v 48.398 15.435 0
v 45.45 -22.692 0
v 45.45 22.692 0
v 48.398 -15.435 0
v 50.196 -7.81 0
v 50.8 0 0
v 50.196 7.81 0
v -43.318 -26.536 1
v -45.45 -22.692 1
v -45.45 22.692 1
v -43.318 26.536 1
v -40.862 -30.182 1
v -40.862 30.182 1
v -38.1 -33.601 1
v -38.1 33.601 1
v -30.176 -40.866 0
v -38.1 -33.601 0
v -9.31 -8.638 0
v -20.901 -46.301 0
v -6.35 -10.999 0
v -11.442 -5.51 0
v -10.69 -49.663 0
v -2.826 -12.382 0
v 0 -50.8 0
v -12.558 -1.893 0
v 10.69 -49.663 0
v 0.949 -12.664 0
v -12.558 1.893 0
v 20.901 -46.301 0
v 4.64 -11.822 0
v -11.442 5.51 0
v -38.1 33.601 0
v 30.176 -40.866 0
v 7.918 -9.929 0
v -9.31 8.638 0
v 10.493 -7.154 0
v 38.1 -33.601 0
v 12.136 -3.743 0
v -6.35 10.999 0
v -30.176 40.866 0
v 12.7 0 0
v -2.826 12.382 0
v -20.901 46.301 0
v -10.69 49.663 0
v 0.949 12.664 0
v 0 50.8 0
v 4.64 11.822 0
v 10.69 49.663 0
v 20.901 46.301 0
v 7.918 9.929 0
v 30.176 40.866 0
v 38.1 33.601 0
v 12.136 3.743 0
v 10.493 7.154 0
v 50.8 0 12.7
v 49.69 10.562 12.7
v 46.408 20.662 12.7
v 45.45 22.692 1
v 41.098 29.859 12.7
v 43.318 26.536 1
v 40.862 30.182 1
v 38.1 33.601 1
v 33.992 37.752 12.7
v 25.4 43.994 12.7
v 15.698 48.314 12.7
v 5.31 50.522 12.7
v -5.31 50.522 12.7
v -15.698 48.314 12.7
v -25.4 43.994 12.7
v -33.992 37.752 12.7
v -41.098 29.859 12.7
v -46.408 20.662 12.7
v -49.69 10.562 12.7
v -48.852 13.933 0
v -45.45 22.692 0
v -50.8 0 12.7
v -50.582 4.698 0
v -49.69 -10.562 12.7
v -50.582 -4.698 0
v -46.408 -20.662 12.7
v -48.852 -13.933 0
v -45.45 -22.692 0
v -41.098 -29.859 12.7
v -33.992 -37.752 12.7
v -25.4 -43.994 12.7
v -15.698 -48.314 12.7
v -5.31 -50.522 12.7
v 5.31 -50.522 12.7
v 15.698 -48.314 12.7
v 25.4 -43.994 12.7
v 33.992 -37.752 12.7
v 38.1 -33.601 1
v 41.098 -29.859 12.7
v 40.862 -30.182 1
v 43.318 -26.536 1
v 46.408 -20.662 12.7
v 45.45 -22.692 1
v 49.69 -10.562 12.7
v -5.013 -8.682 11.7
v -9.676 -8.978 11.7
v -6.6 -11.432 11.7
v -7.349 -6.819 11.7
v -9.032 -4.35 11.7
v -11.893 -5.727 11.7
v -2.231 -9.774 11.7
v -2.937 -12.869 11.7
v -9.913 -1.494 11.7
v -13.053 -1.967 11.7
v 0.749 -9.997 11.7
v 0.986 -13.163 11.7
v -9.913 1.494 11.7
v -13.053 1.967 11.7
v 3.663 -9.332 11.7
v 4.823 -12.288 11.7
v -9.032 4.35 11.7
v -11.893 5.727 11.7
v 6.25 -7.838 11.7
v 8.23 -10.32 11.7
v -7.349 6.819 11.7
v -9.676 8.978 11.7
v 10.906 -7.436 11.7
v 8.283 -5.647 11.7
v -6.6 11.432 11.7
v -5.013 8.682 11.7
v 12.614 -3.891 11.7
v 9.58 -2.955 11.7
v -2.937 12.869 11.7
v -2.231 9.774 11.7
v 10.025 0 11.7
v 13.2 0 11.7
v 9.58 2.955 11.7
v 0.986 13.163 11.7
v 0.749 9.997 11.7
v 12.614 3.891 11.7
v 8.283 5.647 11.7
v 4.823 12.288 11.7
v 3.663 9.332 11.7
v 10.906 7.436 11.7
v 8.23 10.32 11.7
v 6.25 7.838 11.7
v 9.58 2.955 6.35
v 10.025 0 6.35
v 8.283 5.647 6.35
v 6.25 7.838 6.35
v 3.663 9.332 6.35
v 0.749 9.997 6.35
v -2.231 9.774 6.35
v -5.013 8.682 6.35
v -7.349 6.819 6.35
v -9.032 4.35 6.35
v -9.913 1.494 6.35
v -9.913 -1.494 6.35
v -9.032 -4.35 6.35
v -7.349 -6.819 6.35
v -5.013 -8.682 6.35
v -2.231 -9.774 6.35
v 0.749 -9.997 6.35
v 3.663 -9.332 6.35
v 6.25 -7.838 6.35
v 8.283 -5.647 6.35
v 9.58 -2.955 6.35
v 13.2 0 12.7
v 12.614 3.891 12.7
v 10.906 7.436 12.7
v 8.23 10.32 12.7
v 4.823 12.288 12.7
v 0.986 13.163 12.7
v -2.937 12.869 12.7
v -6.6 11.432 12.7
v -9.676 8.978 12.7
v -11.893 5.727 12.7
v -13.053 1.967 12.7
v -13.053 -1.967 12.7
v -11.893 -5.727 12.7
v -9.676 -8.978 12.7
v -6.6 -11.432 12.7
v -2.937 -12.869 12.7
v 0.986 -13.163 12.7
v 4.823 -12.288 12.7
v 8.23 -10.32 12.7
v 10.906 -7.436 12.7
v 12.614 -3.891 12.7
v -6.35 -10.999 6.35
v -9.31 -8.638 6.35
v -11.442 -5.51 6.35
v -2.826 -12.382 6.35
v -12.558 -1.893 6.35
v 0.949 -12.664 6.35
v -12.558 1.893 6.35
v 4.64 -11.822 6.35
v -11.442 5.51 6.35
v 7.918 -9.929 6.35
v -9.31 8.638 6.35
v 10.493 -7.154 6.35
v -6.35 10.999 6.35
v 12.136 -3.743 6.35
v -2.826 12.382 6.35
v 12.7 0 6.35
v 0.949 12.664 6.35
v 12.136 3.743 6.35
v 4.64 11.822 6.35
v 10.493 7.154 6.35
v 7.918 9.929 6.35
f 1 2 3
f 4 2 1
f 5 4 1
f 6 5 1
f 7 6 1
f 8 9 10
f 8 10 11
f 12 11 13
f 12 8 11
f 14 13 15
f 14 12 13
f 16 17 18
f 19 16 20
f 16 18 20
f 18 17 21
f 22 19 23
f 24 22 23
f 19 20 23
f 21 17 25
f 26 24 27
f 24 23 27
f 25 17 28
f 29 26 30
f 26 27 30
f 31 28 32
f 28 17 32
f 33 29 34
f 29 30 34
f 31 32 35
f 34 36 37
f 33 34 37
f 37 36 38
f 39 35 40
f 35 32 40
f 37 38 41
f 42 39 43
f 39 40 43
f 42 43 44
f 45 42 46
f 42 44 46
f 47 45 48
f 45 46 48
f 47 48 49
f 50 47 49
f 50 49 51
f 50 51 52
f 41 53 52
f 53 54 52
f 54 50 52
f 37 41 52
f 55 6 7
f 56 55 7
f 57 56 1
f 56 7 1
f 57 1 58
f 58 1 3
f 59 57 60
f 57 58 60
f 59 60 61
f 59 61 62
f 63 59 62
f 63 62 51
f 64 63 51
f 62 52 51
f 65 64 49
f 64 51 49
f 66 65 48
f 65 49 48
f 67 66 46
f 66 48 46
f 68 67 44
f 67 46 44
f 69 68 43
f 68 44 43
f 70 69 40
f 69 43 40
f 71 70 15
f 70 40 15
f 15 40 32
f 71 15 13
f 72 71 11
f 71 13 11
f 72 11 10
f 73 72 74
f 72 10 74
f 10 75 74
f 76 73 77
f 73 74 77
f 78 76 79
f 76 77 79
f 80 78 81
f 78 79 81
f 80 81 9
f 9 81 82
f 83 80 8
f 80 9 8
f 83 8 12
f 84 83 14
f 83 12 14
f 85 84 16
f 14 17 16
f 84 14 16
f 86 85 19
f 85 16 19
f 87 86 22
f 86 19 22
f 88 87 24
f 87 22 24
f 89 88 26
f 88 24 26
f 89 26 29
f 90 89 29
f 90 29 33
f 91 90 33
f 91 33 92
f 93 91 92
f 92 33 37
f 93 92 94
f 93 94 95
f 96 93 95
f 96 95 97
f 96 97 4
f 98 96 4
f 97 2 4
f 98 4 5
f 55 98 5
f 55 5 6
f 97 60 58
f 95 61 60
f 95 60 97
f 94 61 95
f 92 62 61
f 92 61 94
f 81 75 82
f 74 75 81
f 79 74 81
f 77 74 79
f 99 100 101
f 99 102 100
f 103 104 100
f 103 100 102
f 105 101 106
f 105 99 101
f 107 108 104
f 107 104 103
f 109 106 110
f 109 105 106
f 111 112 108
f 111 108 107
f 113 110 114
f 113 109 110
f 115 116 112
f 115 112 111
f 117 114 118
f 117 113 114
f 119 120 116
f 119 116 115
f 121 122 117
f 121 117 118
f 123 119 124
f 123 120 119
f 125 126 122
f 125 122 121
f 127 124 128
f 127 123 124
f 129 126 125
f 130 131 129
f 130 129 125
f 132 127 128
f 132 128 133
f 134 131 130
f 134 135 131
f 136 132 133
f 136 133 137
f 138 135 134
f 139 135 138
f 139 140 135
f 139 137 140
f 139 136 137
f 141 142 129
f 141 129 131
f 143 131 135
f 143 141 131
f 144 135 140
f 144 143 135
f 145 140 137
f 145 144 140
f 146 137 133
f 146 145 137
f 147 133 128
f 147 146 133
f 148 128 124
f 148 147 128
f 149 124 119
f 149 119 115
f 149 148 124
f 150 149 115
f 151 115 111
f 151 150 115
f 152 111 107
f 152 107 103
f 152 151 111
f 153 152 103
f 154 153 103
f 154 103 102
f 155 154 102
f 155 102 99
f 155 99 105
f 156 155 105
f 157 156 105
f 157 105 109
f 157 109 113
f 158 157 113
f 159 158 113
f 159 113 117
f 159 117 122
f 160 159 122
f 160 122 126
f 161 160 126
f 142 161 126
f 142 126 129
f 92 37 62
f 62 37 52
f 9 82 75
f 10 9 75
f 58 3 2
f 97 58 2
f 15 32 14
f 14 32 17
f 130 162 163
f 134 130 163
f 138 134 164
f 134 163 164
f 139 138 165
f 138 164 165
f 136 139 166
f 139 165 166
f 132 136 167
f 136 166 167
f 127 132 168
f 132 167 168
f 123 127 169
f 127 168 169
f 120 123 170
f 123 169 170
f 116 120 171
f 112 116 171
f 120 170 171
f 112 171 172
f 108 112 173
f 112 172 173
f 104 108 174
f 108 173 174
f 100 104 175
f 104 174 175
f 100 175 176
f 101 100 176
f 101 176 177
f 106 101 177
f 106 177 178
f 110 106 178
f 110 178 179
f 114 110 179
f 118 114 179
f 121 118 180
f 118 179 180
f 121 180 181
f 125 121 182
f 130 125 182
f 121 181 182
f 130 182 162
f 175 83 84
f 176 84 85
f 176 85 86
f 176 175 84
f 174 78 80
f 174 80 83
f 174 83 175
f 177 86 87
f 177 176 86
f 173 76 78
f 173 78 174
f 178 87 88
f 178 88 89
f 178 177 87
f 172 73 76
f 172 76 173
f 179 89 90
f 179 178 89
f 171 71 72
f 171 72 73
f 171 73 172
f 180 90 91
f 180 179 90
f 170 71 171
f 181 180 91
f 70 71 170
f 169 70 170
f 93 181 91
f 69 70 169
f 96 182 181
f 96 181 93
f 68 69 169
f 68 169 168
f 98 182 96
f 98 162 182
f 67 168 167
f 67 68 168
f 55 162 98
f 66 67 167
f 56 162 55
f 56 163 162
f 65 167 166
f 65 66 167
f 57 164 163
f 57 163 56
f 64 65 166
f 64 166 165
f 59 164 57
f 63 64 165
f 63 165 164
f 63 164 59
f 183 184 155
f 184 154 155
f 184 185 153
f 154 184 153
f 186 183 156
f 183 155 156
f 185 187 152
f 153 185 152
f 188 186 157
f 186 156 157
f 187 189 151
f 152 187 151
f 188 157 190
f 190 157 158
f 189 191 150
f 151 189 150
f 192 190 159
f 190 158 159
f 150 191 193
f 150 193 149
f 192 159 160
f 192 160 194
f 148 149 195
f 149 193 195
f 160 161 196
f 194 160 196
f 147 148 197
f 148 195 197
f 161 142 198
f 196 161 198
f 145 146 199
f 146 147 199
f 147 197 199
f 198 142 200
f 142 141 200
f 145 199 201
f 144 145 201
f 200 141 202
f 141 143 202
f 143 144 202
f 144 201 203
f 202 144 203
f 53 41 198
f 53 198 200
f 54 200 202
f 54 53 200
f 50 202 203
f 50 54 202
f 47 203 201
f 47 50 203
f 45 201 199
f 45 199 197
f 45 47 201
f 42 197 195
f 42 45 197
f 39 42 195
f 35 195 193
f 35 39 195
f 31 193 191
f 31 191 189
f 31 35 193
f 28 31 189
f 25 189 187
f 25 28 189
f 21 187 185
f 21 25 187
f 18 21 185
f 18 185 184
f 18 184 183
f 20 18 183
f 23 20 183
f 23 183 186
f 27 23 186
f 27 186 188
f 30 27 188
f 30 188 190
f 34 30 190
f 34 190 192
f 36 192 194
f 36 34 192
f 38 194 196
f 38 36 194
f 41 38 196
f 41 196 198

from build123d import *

# Parameters (mm, degrees)
SKETCH1_R           = 50.8
SKETCH1_R_2         = 13.2
SKETCH1_R_3         = 10.025
SKETCH1_R_4         = 12.7
BOSS_EXTRUDE1_DEPTH = 12.7
CUT_EXTRUDE1_START  = 12.7
SKETCH1_3_R         = 13.2
SKETCH1_3_R_2       = 12.7
SKETCH1_3_R_3       = 10.025
CUT_EXTRUDE1_DEPTH  = 1
SKETCH1_4_R         = 12.7
SKETCH1_4_R_2       = 10.025
CUT_EXTRUDE2_DEPTH  = 6.35
CUT_EXTRUDE3_DEPTH  = 1


with BuildPart() as part:
    # Sketch1 → Boss-Extrude1 (new body)
    with BuildSketch(Plane(origin=(0, 0, 0), x_dir=(0, 1, 0), z_dir=(0, 0, 1))):
        with Locations(Location((0, 0, 0), (0, 0, 270))):
            Circle(SKETCH1_R)
        Circle(SKETCH1_R_2, mode=Mode.SUBTRACT)
        Circle(SKETCH1_R_2)
        with Locations(Location((0, 0, 0), (0, 0, 270))):
            Circle(SKETCH1_R_3, mode=Mode.SUBTRACT)
        Circle(SKETCH1_R_4)
        with Locations(Location((0, 0, 0), (0, 0, 270))):
            Circle(SKETCH1_R_3, mode=Mode.SUBTRACT)
    extrude(amount=BOSS_EXTRUDE1_DEPTH)

    # Sketch1<3> → Cut-Extrude1 (cut)
    with BuildSketch(Plane(origin=(0, 0, 0), x_dir=(0, 1, 0), z_dir=(0, 0, 1)).offset(CUT_EXTRUDE1_START)):
        with Locations(Location((0, 0, 0), (0, 0, 270))):
            Circle(SKETCH1_3_R)
        Circle(SKETCH1_3_R_2, mode=Mode.SUBTRACT)
        Circle(SKETCH1_3_R_2)
        with Locations(Location((0, 0, 0), (0, 0, 270))):
            Circle(SKETCH1_3_R_3, mode=Mode.SUBTRACT)
    extrude(amount=-CUT_EXTRUDE1_DEPTH, mode=Mode.SUBTRACT)

    # Sketch1<4> → Cut-Extrude2 (cut)
    with BuildSketch(Plane(origin=(0, 0, 0), x_dir=(0, 1, 0), z_dir=(0, 0, 1))):
        with Locations(Location((0, 0, 0), (0, 0, 270))):
            Circle(SKETCH1_4_R)
        with Locations(Location((0, 0, 0), (0, 0, 270))):
            Circle(SKETCH1_4_R_2, mode=Mode.SUBTRACT)
    extrude(amount=CUT_EXTRUDE2_DEPTH, mode=Mode.SUBTRACT)

    # Sketch2 → Cut-Extrude3 (cut)
    with BuildSketch(Plane(origin=(0, 0, 0), x_dir=(1, 0, 0), z_dir=(0, 0, -1))):
        with BuildLine():
            Line((-38.1, -33.601041651), (-38.1, 0))
            Line((-38.1, 0), (-38.1, 33.601041651))
            ThreePointArc((-38.1, 33.601041651), (-42.129575647, 28.385539555), (-45.45, 22.692234355))
            Line((-45.45, 22.692234355), (-45.45, -22.692234355))
            ThreePointArc((-45.45, -22.692234355), (-42.129575647, -28.385539555), (-38.1, -33.601041651))
        make_face()
        with BuildLine():
            ThreePointArc((45.45, 22.692234355), (42.129575647, 28.385539555), (38.1, 33.601041651))
            Line((38.1, 33.601041651), (38.1, 0))
            Line((38.1, 0), (38.1, -33.601041651))
            ThreePointArc((38.1, -33.601041651), (42.129575647, -28.385539555), (45.45, -22.692234355))
            Line((45.45, -22.692234355), (45.45, 22.692234355))
        make_face()
    extrude(amount=-CUT_EXTRUDE3_DEPTH, mode=Mode.SUBTRACT)


solid = part.part
